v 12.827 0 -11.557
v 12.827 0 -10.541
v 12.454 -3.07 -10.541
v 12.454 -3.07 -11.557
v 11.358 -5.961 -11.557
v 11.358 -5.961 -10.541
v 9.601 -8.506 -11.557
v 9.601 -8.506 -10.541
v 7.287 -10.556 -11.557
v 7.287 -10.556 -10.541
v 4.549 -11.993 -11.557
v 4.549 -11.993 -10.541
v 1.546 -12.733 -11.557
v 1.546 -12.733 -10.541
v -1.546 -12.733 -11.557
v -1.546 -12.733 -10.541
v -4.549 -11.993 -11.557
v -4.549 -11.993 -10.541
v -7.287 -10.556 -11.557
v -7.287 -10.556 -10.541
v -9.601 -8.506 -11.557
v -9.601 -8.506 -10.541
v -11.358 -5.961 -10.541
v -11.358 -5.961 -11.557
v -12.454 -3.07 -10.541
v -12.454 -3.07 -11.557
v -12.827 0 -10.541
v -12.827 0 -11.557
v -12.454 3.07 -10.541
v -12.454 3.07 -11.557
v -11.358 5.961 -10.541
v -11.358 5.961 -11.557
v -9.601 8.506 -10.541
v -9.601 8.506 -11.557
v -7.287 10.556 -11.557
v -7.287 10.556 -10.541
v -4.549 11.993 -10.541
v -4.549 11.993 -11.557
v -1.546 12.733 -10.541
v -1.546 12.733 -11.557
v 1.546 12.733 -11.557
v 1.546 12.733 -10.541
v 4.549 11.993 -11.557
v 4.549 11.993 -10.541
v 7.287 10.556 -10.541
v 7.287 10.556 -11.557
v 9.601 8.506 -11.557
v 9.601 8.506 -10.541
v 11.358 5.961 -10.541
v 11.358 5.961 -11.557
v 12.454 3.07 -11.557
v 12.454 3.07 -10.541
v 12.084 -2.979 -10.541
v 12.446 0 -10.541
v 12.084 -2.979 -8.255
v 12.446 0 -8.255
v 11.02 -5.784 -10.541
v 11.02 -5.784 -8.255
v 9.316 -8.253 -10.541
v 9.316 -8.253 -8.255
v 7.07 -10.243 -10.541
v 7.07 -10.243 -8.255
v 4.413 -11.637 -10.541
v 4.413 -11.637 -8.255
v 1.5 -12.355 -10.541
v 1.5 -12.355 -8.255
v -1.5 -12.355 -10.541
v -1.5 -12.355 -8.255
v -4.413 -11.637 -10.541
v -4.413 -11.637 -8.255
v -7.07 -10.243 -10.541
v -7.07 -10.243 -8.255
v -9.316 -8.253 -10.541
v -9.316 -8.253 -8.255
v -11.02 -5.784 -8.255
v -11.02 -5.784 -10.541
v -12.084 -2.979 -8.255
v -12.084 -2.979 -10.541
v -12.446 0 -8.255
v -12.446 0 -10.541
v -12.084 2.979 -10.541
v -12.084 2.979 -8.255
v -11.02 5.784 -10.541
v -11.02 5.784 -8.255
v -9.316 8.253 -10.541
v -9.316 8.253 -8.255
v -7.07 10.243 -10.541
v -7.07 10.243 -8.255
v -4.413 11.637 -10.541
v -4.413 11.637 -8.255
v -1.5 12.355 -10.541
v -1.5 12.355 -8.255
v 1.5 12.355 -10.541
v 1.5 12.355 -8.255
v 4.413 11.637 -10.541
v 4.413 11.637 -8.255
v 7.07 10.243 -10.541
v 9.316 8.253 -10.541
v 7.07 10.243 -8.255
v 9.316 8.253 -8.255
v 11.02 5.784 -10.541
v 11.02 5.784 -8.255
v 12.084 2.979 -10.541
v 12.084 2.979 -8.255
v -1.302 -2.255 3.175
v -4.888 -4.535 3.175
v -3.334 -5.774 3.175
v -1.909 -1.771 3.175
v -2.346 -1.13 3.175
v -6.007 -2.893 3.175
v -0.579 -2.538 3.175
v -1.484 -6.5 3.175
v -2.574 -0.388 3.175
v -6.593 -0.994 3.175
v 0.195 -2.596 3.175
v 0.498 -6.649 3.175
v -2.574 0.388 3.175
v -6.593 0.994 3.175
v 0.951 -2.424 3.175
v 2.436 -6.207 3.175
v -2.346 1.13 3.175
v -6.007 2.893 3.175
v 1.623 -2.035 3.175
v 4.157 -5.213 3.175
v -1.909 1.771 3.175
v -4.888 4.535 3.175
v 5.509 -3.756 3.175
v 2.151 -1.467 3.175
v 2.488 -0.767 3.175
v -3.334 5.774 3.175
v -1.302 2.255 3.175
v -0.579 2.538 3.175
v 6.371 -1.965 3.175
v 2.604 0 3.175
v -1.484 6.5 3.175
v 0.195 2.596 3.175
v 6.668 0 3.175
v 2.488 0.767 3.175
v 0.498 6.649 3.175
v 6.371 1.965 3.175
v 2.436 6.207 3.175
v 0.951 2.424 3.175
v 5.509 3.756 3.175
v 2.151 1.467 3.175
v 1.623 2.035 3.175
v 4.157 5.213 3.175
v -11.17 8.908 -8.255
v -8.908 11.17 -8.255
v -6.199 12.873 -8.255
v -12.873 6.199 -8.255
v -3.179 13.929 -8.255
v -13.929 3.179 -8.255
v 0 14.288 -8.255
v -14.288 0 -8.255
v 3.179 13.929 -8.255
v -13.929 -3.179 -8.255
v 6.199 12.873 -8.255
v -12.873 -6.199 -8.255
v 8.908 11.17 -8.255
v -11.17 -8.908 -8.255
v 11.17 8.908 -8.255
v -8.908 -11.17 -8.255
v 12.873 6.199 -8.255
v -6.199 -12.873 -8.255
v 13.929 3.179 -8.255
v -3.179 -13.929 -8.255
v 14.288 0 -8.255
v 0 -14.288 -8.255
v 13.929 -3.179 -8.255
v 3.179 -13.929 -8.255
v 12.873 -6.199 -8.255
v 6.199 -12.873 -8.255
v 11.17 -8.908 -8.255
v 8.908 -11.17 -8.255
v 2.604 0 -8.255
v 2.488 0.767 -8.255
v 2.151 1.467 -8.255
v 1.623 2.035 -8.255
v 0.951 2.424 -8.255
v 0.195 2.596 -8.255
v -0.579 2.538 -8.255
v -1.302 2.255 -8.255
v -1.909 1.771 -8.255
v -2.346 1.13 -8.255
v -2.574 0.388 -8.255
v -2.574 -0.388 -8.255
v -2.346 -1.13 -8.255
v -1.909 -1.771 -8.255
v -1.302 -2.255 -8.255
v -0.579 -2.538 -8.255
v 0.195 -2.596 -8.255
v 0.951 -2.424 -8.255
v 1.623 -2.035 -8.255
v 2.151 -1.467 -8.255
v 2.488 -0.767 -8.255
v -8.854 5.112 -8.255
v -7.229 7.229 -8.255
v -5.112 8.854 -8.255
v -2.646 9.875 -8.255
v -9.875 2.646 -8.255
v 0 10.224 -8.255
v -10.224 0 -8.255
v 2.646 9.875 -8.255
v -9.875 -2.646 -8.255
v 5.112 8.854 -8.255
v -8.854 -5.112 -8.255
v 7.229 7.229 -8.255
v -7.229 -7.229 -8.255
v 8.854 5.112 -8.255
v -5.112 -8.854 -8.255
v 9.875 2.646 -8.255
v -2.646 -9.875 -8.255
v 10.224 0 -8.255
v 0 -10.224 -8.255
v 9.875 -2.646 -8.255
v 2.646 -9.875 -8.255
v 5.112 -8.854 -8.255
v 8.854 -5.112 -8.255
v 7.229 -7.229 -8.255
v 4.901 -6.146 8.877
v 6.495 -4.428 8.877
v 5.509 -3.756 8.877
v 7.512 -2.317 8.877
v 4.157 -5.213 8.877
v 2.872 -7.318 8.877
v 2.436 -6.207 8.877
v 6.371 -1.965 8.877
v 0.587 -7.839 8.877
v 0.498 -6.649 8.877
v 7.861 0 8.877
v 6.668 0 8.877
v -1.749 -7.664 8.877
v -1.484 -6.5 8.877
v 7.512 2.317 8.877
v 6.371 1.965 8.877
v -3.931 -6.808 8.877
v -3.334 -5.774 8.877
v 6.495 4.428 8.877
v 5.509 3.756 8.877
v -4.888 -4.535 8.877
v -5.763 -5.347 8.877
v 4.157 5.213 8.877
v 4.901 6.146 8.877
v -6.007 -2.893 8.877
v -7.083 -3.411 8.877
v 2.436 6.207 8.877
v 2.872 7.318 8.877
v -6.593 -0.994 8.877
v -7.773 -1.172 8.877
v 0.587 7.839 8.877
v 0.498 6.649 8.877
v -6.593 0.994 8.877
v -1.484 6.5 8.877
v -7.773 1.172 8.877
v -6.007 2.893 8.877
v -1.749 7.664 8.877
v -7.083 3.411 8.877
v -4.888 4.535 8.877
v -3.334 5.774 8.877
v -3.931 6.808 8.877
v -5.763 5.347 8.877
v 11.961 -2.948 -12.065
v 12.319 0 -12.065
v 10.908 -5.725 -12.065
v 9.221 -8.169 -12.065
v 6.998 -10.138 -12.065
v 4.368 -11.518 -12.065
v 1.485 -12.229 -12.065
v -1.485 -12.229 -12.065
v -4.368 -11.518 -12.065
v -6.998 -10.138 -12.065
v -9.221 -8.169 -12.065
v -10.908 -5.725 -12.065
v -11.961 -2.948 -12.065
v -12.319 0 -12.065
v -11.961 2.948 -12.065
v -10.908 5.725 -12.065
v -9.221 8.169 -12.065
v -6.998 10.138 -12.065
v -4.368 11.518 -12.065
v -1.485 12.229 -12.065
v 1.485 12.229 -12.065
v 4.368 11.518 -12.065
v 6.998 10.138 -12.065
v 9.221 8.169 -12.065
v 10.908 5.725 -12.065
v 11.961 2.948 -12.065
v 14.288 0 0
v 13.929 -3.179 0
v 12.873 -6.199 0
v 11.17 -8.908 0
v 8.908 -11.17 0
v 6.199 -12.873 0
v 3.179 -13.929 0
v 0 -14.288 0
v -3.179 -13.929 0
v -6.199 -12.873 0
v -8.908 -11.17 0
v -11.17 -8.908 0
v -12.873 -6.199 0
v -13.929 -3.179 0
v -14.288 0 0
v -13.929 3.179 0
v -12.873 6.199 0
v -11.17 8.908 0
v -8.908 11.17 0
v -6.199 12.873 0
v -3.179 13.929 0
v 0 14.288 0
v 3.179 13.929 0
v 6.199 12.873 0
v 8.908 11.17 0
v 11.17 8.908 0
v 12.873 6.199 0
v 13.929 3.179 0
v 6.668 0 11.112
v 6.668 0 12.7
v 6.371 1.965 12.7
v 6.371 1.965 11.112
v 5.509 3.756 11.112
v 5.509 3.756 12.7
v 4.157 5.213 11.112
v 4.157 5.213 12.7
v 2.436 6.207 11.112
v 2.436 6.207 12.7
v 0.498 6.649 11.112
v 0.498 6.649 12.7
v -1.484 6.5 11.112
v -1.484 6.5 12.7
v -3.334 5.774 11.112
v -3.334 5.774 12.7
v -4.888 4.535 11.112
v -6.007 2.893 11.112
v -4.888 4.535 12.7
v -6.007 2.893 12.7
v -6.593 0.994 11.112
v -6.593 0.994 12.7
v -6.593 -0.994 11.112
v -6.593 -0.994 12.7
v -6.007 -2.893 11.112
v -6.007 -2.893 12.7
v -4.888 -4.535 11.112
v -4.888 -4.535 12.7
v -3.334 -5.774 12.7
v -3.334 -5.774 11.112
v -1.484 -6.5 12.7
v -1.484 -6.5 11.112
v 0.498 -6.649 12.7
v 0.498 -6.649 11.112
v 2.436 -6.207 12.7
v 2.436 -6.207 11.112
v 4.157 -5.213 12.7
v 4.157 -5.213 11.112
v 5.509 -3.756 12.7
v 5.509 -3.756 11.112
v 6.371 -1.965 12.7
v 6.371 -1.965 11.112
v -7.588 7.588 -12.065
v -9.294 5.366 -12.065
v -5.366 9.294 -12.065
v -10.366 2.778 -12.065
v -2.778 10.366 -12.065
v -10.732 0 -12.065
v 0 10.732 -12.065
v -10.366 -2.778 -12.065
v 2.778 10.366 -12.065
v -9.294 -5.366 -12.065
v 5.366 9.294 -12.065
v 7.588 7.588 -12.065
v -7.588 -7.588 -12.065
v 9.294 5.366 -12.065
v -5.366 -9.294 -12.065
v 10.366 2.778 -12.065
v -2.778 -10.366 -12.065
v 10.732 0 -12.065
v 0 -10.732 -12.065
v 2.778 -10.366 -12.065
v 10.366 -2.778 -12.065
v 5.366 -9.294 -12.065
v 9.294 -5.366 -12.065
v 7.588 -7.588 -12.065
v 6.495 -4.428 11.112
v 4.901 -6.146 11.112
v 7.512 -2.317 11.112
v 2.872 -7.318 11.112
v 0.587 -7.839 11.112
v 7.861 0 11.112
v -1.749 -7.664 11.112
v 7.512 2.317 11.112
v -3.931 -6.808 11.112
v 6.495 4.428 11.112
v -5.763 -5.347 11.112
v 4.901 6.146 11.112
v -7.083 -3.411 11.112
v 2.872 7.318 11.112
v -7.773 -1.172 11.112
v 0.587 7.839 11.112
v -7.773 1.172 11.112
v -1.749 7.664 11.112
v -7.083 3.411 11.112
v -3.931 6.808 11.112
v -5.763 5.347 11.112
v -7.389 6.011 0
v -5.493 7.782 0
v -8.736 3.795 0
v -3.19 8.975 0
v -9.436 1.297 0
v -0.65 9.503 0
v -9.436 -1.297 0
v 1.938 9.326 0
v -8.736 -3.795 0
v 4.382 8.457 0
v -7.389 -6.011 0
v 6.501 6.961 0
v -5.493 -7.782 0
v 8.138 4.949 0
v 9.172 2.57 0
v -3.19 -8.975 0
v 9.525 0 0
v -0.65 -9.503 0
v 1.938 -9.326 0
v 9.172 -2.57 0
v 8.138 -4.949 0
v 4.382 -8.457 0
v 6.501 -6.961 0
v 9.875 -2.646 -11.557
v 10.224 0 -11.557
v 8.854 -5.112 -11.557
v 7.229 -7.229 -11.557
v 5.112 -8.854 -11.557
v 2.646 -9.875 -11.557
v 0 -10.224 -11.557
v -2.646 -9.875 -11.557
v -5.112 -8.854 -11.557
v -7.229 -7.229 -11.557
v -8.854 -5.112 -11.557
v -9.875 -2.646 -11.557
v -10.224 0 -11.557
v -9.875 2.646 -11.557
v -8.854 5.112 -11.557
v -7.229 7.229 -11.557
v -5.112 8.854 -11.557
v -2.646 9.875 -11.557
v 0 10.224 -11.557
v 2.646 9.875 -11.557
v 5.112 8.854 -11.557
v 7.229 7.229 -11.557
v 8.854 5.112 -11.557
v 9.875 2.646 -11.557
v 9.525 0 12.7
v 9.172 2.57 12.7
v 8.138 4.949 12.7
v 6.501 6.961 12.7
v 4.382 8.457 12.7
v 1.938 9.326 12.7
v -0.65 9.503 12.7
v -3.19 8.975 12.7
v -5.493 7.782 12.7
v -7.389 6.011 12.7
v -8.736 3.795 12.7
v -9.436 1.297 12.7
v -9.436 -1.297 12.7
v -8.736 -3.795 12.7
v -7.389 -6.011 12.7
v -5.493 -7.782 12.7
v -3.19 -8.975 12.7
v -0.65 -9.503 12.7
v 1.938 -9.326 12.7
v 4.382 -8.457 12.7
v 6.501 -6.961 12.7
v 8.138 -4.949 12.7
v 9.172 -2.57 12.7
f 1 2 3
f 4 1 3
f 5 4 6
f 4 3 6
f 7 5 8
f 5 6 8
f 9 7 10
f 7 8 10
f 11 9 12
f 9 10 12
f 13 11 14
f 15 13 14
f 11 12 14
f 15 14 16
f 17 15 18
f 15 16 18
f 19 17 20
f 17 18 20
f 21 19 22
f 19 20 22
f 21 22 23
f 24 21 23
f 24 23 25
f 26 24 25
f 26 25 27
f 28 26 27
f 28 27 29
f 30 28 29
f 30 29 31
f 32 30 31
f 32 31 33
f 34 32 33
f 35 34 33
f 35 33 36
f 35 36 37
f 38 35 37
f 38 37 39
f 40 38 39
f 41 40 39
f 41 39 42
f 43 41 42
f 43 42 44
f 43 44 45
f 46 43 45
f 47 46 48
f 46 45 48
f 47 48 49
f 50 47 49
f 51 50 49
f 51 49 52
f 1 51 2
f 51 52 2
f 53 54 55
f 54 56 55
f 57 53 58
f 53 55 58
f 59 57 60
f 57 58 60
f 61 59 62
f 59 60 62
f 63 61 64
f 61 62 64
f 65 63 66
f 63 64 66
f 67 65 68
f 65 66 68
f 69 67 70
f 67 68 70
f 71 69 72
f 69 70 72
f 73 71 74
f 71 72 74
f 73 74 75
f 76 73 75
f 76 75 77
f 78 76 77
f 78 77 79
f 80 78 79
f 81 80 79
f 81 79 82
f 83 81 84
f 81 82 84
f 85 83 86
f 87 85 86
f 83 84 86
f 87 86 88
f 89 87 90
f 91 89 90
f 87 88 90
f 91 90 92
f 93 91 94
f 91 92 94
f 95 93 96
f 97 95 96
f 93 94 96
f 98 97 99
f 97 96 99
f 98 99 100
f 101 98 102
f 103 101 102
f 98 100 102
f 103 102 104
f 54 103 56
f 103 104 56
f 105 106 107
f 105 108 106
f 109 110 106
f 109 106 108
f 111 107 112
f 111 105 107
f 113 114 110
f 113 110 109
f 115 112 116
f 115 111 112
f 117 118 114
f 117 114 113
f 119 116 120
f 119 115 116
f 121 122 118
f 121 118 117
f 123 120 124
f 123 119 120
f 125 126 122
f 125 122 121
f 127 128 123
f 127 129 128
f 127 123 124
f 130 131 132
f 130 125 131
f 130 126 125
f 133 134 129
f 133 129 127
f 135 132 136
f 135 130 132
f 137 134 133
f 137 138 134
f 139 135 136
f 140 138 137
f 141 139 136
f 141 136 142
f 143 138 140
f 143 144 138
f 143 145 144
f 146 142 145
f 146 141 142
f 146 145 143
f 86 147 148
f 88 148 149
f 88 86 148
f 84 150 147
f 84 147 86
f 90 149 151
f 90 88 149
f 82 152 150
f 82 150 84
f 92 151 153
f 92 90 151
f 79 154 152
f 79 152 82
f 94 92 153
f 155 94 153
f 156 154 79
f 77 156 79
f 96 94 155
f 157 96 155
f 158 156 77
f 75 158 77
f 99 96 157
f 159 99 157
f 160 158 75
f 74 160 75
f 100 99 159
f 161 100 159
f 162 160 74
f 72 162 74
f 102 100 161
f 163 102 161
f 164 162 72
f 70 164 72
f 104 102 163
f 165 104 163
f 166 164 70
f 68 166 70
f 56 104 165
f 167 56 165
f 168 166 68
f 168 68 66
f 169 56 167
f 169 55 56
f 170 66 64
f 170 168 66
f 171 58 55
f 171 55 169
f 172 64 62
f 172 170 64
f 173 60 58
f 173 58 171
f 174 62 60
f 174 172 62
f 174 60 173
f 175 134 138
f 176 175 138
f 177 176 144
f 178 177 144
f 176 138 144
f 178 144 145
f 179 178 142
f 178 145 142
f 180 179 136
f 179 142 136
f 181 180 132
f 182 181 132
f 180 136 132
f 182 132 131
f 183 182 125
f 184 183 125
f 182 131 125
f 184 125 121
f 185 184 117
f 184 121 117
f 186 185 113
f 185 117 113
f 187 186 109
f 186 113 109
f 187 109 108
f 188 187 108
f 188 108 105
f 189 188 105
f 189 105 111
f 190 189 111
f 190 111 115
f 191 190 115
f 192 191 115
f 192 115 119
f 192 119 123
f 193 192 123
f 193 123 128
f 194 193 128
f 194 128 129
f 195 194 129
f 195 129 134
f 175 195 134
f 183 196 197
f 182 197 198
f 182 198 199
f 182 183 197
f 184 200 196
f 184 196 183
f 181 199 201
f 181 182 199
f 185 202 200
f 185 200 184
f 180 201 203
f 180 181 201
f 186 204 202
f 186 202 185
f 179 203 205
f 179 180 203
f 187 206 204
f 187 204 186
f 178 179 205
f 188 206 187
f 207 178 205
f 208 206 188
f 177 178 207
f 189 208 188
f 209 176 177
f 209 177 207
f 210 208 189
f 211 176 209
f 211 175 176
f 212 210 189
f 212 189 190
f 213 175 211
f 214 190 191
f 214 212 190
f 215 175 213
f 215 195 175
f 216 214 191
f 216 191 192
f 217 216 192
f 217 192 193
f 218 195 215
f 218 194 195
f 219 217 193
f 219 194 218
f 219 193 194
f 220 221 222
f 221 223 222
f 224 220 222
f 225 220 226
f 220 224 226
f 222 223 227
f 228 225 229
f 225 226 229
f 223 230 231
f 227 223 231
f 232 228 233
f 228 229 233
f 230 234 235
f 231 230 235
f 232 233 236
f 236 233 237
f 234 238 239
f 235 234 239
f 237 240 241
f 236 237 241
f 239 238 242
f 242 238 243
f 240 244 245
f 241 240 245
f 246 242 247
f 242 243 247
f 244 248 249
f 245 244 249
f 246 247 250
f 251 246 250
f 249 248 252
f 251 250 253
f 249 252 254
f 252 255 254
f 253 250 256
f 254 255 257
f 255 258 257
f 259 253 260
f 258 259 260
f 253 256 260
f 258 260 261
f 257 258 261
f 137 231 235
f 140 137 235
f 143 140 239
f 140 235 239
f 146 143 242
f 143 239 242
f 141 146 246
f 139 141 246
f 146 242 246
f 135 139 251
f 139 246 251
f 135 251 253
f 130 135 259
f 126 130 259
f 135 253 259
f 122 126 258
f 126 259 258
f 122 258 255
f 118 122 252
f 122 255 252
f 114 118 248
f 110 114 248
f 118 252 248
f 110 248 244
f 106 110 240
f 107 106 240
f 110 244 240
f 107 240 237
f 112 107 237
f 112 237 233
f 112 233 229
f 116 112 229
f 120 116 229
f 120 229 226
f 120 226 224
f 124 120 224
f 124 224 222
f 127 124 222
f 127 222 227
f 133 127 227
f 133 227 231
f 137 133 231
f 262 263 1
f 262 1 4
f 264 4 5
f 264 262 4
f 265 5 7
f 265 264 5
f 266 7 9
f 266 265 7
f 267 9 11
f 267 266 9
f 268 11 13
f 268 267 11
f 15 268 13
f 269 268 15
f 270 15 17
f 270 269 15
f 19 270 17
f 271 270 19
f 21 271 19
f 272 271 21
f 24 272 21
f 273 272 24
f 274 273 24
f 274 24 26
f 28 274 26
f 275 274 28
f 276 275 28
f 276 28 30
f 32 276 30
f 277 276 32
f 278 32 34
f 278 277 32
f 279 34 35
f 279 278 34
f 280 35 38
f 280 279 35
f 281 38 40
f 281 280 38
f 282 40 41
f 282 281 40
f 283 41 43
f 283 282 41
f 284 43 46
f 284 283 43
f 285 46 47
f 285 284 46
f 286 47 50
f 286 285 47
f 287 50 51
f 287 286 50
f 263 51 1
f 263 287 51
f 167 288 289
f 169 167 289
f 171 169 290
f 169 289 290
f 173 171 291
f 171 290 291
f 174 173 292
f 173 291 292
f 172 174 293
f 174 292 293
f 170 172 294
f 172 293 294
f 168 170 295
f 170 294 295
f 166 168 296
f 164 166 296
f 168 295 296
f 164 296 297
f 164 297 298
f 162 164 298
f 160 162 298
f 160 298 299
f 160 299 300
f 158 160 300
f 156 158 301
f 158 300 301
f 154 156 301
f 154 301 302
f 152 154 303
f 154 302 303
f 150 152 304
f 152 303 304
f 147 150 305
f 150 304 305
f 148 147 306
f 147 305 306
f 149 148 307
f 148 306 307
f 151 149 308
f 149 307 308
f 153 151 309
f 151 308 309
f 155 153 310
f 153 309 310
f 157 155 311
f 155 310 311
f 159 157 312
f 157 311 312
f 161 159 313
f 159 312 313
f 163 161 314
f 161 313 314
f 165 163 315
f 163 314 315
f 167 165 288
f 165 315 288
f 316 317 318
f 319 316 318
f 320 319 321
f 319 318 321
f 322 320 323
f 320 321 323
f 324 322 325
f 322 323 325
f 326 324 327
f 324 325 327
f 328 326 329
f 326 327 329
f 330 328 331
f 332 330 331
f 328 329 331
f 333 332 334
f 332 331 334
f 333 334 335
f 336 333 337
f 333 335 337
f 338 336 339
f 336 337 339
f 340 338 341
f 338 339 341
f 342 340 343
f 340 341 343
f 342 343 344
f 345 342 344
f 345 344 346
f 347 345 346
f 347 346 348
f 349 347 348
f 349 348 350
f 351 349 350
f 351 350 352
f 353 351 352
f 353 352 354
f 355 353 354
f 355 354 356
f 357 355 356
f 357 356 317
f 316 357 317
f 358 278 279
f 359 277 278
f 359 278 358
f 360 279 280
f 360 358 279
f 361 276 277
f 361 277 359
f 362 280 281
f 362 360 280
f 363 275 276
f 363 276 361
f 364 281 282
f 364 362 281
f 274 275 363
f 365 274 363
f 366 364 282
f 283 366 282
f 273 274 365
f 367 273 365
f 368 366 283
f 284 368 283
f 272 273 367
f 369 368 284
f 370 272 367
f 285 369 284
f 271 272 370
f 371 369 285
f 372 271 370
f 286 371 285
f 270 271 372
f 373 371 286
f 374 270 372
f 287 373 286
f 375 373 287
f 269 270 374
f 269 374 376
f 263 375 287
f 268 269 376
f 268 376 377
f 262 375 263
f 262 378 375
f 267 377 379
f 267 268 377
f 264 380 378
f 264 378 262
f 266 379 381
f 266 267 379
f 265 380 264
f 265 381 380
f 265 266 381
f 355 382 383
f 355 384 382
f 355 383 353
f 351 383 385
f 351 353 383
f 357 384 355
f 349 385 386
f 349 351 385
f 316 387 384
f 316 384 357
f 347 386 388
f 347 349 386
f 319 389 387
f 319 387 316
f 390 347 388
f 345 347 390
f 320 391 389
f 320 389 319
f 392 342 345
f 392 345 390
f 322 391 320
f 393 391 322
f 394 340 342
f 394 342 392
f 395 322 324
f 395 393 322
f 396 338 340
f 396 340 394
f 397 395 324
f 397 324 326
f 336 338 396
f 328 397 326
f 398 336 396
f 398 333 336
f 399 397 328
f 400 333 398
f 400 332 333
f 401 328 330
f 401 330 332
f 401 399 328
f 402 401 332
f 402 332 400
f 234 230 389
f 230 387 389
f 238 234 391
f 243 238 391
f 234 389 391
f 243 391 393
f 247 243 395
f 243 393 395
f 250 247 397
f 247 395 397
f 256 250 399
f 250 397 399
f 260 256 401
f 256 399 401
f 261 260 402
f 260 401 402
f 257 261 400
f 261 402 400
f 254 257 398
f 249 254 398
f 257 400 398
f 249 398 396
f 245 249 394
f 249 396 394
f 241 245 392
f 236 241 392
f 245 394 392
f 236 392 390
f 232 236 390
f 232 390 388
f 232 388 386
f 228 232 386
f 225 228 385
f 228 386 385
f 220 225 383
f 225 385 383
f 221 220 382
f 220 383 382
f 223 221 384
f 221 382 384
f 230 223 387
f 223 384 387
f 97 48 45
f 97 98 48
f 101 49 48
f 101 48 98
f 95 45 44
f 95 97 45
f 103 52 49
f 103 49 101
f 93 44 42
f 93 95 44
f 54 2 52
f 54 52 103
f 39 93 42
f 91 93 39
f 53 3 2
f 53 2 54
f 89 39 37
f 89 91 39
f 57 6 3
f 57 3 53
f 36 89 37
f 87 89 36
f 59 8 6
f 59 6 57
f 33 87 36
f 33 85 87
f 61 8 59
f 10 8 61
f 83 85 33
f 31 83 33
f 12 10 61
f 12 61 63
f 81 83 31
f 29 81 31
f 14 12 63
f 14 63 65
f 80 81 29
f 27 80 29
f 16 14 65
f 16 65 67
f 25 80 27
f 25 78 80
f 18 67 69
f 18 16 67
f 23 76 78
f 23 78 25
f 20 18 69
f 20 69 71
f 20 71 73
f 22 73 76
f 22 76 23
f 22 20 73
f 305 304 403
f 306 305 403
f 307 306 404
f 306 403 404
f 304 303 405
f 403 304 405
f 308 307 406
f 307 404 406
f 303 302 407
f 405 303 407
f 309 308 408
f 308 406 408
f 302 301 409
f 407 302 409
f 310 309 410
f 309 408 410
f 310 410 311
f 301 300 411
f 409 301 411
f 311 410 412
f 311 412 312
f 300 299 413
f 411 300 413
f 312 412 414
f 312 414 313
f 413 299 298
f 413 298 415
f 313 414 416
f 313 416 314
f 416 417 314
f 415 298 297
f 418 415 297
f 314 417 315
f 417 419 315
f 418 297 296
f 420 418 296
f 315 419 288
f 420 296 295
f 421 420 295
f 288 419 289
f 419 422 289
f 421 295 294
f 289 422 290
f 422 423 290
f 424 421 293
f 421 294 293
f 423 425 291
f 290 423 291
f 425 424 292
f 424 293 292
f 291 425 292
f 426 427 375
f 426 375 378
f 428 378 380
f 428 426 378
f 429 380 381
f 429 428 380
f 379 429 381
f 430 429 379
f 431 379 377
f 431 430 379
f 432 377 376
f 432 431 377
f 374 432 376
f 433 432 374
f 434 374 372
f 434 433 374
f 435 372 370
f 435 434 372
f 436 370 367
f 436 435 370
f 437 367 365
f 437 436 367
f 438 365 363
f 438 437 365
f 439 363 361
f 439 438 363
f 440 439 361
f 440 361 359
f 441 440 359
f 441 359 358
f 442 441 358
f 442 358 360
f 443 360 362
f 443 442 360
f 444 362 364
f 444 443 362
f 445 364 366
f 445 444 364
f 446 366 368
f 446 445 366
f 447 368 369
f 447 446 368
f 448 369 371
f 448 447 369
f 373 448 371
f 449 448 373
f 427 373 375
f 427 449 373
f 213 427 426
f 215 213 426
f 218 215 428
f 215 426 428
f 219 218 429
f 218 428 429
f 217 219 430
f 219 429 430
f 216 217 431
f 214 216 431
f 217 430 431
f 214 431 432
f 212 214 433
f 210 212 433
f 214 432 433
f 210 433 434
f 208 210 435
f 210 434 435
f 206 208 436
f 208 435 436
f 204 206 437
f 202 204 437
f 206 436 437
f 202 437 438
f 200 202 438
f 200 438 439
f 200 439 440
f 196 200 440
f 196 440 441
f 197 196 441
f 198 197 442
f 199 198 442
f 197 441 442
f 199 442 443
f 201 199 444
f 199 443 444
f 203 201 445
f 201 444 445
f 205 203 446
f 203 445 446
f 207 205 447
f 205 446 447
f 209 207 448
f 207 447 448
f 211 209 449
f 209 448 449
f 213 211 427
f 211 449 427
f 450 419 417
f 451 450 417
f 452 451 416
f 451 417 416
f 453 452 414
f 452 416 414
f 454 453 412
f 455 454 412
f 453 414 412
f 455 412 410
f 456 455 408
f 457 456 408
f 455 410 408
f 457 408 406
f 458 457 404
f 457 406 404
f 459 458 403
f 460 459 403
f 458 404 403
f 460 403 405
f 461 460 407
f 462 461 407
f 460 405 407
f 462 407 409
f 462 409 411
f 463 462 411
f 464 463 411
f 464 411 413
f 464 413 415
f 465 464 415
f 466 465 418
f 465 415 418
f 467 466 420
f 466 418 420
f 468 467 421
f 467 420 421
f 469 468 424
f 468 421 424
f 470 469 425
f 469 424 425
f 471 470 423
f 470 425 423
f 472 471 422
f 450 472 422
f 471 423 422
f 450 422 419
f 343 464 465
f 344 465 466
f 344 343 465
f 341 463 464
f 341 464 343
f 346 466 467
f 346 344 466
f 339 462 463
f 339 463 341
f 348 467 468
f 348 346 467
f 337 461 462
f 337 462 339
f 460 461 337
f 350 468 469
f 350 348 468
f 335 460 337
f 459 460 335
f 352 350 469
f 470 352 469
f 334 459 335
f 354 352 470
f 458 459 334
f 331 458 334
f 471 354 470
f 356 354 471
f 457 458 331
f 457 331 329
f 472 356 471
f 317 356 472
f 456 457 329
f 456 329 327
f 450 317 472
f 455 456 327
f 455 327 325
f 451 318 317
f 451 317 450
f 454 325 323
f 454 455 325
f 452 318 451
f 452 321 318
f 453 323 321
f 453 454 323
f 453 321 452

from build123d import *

# Parameters (mm, degrees)
F0_R           = 9.525
F1_DEPTH       = 12.7
F2_R           = 6.6675
F3_DEPTH       = 9.525
F4_W           = 1.1938
F4_H           = 2.2352
F6_R           = 14.2875
F6_R_2         = 9.525
F7_DEPTH       = 8.255
F8_R           = 12.827
F9_DEPTH       = 3.81
F10_R          = 10.2235
F11_DEPTH      = 3.81
F12_W          = 0.381
F12_H          = 2.286
F14_R          = 2.6035
F15_DEPTH      = 25.4
F15_DEPTH_BACK = 25.4
F16_SIZE       = 0.508


with BuildPart() as f1:
    # F0 (on Top) → F1 (new body)
    with BuildSketch(Plane.XY):
        Circle(F0_R)
    extrude(amount=F1_DEPTH)

    # F2 (on face) → F3 (cut)
    with BuildSketch(Plane.XY.offset(12.7)):
        Circle(F2_R)
    extrude(amount=-F3_DEPTH, mode=Mode.SUBTRACT)

    # F4 (on Front) → F5 (revolve, cut)
    with BuildSketch(Plane.XZ):
        with Locations((7.2644, 9.9949)):
            Rectangle(F4_W, F4_H)
    revolve(axis=Axis((0, 0, 19.0221574157), (0, 0, 1)), mode=Mode.SUBTRACT)

    # F6 (on face) → F7 (join)
    with BuildSketch(Plane(origin=(0, 0, 0), x_dir=(1, 0, 0), z_dir=(0, 0, -1))):
        Circle(F6_R)
        Circle(F6_R_2, mode=Mode.SUBTRACT)
        Circle(F6_R_2)
    extrude(amount=F7_DEPTH)

    # F8 (on face) → F9 (join)
    with BuildSketch(Plane(origin=(0, 0, -8.255), x_dir=(1, 0, 0), z_dir=(0, 0, -1))):
        Circle(F8_R)
    extrude(amount=F9_DEPTH)

    # F10 (on face) → F11 (cut)
    with BuildSketch(Plane(origin=(0, 0, -12.065), x_dir=(1, 0, 0), z_dir=(0, 0, -1))):
        Circle(F10_R)
    extrude(amount=-F11_DEPTH, mode=Mode.SUBTRACT)

    # F12 (on Front) → F13 (revolve, cut)
    with BuildSketch(Plane.XZ):
        with Locations((12.6365, -9.398)):
            Rectangle(F12_W, F12_H)
    revolve(axis=Axis((0, 0, -8.9314272627), (0, 0, -1)), mode=Mode.SUBTRACT)

    # F14 (on face) → F15 (cut, two sides)
    with BuildSketch(Plane.XY.offset(3.175)) as f15_sk:
        Circle(F14_R)
    extrude(amount=-F15_DEPTH, mode=Mode.SUBTRACT)
    extrude(f15_sk.sketch, amount=F15_DEPTH_BACK, mode=Mode.SUBTRACT)

    # F16
    f16_edges = [f1.edges().sort_by_distance(p)[0] for p in [
        (-10.2235, 0, -12.065),
        (-12.827, 0, -12.065),
    ]]
    chamfer(f16_edges, length=F16_SIZE)


solid = f1.part
